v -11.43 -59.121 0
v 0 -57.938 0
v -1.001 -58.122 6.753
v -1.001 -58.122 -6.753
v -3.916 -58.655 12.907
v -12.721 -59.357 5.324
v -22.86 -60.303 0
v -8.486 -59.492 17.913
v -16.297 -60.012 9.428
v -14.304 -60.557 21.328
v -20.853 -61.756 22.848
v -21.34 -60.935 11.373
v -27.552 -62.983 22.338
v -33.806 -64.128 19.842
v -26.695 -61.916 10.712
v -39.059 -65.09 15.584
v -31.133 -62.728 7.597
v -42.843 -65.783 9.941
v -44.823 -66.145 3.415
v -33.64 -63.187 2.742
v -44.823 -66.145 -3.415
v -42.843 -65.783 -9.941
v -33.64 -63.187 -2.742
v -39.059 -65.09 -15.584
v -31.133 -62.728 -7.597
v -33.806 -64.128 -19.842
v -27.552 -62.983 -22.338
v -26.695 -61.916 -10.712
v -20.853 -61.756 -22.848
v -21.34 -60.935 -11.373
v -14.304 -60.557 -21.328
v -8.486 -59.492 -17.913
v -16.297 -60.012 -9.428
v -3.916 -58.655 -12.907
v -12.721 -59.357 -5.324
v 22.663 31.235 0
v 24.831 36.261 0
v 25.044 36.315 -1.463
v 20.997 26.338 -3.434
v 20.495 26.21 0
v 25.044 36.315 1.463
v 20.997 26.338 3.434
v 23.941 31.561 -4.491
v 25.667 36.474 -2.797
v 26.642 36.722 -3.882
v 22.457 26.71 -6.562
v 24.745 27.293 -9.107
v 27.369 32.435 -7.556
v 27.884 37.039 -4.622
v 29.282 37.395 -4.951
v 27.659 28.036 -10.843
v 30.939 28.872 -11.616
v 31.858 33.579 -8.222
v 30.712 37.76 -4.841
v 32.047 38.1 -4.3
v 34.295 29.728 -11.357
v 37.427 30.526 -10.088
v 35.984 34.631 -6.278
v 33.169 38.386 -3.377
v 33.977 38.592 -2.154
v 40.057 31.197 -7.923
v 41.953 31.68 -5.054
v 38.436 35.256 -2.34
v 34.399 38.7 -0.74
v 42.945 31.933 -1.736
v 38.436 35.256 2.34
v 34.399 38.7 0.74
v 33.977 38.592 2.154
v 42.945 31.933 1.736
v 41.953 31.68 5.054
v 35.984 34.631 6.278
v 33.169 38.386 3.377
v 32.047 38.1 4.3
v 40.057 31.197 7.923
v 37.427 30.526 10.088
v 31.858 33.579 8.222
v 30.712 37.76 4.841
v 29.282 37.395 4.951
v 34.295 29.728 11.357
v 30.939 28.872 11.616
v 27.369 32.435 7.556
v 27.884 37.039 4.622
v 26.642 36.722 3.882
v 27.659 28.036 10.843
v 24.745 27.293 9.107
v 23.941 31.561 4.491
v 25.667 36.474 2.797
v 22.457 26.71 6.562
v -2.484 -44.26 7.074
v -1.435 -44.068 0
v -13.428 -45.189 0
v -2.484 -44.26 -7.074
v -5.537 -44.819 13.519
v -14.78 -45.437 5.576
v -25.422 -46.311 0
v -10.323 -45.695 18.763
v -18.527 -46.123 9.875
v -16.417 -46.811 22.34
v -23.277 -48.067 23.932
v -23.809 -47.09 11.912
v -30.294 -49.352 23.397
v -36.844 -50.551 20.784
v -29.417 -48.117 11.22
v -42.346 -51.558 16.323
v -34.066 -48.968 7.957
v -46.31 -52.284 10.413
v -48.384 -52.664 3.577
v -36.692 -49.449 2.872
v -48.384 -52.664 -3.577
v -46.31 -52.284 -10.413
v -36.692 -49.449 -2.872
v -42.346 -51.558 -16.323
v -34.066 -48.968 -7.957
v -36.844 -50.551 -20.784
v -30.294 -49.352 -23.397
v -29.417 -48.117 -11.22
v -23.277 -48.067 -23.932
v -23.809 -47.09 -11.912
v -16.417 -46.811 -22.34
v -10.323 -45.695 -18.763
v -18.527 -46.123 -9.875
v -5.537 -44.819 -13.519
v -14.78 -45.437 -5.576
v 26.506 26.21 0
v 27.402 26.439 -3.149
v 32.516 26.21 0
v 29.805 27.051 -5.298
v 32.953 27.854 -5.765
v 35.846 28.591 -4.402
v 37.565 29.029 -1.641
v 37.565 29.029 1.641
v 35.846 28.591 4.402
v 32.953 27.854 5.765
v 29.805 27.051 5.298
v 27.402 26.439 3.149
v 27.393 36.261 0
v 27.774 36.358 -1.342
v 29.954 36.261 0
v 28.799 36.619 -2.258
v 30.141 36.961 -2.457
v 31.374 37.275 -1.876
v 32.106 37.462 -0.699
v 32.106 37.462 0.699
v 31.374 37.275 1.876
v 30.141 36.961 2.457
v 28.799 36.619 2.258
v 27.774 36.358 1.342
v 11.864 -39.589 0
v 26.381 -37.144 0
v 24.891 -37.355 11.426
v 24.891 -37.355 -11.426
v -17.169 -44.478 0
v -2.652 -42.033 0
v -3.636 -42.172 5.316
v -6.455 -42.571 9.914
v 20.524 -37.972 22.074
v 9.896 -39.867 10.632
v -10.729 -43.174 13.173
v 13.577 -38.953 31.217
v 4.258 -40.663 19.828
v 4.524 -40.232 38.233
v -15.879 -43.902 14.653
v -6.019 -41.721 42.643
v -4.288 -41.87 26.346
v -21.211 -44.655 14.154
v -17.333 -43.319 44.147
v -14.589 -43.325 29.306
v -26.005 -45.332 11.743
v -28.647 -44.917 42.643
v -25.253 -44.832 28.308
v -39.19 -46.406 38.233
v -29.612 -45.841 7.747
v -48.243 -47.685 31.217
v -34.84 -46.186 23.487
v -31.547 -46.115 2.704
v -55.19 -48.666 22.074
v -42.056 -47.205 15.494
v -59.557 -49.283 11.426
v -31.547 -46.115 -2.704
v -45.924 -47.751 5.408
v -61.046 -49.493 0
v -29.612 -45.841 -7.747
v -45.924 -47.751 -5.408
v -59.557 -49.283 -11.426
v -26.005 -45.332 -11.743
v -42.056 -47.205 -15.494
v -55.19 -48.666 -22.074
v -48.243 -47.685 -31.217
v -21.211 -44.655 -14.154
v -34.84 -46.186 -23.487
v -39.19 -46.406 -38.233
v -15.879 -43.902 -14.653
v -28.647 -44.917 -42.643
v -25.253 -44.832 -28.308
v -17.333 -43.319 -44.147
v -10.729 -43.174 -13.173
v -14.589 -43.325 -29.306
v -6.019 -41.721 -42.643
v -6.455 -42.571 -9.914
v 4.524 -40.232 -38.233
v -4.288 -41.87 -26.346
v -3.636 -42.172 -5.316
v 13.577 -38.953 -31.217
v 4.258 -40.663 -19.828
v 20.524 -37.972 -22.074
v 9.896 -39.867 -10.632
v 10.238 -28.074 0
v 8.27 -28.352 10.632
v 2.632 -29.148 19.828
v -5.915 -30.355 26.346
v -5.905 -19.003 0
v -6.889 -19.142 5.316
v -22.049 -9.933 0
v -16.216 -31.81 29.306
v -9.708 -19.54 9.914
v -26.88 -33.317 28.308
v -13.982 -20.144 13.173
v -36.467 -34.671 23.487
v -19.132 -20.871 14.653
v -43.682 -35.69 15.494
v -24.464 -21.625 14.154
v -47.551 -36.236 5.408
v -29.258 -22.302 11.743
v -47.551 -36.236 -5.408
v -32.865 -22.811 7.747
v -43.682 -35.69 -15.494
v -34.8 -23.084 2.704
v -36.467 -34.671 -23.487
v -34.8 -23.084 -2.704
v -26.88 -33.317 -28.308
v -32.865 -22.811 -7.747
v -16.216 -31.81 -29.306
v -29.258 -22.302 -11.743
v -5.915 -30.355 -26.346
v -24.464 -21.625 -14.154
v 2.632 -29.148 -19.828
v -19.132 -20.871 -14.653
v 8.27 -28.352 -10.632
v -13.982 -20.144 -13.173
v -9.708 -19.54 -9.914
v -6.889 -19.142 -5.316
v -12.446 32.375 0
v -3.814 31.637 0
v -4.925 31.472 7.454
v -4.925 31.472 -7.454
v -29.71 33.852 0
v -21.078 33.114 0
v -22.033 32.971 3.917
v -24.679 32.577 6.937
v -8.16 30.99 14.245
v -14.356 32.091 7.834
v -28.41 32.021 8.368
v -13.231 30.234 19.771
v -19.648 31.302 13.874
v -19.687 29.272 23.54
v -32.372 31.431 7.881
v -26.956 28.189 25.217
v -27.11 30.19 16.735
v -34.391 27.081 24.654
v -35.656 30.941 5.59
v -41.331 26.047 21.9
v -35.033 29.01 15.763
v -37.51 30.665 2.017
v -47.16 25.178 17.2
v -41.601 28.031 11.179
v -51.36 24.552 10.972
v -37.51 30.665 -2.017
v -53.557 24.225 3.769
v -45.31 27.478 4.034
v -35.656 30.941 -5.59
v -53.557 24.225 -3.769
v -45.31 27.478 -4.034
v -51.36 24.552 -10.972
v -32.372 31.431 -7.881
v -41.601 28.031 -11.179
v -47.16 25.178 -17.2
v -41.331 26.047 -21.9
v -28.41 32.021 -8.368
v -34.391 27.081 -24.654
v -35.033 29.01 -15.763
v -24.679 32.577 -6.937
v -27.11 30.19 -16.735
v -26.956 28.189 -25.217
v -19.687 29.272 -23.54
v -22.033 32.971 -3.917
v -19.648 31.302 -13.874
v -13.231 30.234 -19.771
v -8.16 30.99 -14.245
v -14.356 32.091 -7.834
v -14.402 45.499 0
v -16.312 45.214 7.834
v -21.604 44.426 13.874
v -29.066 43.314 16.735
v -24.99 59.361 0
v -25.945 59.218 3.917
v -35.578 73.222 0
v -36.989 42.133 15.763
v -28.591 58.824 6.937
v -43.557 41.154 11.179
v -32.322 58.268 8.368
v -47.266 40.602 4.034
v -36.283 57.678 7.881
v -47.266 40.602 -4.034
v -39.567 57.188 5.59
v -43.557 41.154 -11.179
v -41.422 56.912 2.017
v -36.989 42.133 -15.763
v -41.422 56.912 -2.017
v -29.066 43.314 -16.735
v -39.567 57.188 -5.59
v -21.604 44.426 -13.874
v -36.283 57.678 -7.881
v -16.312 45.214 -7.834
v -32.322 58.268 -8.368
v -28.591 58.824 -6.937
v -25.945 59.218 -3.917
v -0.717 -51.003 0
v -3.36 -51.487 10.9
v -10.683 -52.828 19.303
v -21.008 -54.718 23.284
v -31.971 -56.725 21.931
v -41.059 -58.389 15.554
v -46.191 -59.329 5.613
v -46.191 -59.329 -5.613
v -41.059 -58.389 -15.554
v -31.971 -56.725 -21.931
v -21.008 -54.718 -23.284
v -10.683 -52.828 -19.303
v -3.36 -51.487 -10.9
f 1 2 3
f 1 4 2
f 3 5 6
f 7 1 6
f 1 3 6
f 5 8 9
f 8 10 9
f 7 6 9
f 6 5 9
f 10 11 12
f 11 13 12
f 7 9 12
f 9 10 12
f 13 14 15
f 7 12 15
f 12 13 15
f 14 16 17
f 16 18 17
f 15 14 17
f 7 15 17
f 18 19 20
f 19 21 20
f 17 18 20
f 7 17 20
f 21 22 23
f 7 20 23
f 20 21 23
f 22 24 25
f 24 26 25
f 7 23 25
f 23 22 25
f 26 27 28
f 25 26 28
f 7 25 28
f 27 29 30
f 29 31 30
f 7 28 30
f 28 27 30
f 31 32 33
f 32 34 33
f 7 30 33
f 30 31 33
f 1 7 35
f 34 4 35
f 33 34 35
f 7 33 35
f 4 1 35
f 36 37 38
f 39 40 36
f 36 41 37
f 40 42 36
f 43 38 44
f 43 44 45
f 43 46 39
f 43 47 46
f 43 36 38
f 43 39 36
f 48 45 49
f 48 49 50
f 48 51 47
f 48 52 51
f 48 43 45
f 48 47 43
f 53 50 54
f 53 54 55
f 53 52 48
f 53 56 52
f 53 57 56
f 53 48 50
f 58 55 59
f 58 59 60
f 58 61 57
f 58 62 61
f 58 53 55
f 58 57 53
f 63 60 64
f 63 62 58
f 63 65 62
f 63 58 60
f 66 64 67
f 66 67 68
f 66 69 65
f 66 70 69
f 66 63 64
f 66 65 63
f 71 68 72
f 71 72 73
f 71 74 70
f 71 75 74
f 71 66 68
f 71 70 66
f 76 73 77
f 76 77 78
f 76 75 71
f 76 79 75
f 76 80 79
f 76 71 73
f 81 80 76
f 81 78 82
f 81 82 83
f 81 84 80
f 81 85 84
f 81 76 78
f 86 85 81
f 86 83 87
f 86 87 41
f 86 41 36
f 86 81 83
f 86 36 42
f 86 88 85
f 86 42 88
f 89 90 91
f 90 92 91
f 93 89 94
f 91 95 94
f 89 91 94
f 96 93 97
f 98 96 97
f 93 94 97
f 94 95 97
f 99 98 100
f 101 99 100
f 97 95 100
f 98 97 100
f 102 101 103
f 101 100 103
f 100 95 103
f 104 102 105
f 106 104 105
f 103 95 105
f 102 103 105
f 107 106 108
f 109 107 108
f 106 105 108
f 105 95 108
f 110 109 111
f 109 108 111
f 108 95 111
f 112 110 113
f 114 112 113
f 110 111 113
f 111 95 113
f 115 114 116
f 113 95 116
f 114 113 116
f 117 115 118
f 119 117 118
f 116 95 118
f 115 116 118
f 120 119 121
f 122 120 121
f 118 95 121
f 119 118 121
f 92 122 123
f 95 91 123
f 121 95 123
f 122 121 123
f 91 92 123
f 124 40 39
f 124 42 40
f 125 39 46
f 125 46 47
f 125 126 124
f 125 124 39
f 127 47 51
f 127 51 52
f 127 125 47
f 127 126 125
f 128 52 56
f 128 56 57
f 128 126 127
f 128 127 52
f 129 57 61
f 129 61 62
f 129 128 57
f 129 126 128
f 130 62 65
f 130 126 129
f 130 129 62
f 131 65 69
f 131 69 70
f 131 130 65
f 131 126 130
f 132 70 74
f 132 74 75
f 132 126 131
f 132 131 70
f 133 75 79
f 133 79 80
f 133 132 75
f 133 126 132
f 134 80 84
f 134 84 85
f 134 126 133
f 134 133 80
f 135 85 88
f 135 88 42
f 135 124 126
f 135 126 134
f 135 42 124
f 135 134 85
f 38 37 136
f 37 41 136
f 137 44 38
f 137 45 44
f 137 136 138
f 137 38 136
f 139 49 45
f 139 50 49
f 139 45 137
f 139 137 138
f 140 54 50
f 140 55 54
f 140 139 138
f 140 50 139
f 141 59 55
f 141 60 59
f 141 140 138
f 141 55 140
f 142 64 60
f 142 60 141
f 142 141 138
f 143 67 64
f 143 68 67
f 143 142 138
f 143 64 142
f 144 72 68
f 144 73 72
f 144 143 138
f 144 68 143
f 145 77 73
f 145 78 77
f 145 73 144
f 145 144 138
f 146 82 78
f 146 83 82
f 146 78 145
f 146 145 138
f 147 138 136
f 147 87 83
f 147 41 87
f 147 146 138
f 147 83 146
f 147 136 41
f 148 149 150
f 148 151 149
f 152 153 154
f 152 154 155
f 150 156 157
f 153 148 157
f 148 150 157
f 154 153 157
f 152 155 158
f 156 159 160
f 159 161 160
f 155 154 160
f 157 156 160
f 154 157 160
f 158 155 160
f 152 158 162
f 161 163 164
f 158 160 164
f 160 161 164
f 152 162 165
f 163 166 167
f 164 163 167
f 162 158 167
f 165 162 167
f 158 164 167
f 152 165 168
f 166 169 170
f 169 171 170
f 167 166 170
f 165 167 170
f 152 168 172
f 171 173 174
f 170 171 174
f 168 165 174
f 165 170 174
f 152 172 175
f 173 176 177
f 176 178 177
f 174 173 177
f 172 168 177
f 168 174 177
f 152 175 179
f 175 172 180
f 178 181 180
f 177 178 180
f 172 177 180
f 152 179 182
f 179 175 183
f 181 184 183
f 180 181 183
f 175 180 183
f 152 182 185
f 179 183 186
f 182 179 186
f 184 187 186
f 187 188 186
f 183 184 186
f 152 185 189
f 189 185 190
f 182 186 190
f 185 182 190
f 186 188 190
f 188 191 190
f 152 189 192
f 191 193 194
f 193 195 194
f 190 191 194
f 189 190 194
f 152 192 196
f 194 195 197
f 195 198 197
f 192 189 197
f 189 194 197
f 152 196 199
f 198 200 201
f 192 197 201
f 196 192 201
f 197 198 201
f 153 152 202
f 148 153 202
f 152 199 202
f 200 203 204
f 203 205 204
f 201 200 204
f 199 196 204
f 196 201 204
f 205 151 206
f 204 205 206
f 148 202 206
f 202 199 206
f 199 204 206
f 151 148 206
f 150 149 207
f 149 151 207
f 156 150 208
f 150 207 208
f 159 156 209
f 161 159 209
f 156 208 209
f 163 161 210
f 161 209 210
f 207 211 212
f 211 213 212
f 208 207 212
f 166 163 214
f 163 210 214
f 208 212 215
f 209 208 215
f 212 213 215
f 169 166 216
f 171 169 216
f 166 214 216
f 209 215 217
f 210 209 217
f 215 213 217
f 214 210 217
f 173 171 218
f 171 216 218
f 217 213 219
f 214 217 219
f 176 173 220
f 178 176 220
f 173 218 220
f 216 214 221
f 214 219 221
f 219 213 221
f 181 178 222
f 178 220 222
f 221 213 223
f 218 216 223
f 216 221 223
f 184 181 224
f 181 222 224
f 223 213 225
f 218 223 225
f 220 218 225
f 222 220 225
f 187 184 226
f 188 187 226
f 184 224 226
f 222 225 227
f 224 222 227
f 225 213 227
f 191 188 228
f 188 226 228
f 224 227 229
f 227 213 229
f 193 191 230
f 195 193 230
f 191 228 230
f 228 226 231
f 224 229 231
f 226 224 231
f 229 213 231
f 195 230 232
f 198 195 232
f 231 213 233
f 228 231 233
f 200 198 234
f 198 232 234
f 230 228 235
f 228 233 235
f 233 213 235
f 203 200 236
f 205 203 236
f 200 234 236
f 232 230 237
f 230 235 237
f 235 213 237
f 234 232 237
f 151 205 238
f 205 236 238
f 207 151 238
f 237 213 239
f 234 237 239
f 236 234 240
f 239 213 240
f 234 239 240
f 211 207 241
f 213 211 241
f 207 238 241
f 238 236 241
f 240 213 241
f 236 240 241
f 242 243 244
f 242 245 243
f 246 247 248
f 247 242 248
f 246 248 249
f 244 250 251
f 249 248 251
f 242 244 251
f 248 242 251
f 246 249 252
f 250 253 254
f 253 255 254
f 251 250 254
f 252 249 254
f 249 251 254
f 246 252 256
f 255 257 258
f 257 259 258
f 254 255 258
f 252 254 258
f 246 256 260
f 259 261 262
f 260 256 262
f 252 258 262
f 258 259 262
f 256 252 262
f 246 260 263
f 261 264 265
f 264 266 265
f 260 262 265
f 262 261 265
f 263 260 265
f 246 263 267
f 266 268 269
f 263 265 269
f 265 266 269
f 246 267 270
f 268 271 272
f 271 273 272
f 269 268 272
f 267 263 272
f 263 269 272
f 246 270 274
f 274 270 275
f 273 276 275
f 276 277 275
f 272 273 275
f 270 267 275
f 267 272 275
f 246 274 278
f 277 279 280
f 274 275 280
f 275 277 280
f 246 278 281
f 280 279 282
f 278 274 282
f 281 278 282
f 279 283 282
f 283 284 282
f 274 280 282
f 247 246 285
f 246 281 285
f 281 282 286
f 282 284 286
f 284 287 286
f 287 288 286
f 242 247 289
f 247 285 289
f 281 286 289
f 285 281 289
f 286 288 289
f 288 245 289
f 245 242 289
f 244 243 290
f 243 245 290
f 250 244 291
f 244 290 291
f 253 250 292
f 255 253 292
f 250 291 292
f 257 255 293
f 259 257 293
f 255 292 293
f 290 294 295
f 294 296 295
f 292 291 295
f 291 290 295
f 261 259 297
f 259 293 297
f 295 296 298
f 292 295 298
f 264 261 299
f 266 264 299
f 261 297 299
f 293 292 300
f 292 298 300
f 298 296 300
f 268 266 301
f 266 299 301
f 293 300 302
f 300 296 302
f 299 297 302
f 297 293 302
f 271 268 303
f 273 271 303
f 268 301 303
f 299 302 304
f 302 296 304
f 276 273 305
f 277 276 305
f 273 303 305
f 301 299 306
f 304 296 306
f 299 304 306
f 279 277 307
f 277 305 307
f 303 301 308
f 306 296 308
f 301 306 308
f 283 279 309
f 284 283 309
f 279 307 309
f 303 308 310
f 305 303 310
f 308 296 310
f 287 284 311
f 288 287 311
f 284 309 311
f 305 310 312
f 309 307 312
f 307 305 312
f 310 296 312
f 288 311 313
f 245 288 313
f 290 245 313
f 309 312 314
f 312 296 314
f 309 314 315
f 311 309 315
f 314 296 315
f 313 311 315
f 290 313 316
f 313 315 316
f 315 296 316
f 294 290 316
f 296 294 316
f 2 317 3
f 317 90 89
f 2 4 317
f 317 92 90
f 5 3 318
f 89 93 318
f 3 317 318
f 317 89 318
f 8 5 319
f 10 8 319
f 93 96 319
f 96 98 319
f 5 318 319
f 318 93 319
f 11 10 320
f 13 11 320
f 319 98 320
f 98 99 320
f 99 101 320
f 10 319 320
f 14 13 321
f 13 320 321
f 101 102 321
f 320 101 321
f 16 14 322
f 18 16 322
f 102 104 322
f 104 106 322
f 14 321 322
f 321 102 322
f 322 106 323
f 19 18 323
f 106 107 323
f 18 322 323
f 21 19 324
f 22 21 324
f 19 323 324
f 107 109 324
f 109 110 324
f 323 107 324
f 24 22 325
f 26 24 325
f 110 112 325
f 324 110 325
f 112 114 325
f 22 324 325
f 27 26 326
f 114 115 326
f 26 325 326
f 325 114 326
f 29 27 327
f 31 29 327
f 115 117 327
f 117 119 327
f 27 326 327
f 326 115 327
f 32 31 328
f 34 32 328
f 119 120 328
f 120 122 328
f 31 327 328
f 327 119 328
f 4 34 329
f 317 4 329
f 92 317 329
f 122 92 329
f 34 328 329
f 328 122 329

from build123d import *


# Not quite as in the source:
# - the program builds the solid bodies; features that only make, move or delete a surface that nothing else refers to are left out


with BuildPart() as f1:
    # F0 (on Top) → F1 (revolve)
    with BuildSketch(Plane.XY):
        Polygon((-3.8136900403, 31.637430191), (-35.5775393546, 73.2222646475), (-29.7104893918, 33.8516127608), align=None)
    revolve(axis=Axis((-24.3563177064, -2.0773857832, 0), (0.147393288, -0.9890779639, 0)))


with BuildPart() as f5:
    # F4 (on Top) → F5 (revolve)
    with BuildSketch(Plane.XY):
        Polygon((26.3807494193, -37.1444262564), (-22.0485106111, -9.9326465279), (-17.1690713614, -44.4780178368), align=None)
    revolve(axis=Axis((-19.6087909862, -27.2053321823, 0), (0.1398590071, -0.9901714287, 0)))


with BuildPart() as f7:
    # F6 (on Top) → F7 (revolve)
    with BuildSketch(Plane.XY):
        Polygon((-1.4348968238, -44.0676359677), (-25.4218969494, -46.3112071157), (-22.85999991, -60.303106904), (0, -57.9382739961), align=None)
    revolve(axis=Axis((-24.1409484297, -53.3071570098, 0), (0.1801044624, -0.983647489, 0)))


with BuildPart() as f9:
    # F8 (on Top) → F9 (revolve)
    with BuildSketch(Plane.XY):
        Polygon((29.9544837326, 36.2606905401), (24.8306915164, 36.2606905401), (20.49517259, 26.2101721019), (32.5163789093, 26.2101721019), align=None)
    revolve(axis=Axis((31.235431321, 31.235431321, 0), (0.247003553, -0.9690145741, 0)))


solid = Compound([f1.part, f5.part, f7.part, f9.part])
